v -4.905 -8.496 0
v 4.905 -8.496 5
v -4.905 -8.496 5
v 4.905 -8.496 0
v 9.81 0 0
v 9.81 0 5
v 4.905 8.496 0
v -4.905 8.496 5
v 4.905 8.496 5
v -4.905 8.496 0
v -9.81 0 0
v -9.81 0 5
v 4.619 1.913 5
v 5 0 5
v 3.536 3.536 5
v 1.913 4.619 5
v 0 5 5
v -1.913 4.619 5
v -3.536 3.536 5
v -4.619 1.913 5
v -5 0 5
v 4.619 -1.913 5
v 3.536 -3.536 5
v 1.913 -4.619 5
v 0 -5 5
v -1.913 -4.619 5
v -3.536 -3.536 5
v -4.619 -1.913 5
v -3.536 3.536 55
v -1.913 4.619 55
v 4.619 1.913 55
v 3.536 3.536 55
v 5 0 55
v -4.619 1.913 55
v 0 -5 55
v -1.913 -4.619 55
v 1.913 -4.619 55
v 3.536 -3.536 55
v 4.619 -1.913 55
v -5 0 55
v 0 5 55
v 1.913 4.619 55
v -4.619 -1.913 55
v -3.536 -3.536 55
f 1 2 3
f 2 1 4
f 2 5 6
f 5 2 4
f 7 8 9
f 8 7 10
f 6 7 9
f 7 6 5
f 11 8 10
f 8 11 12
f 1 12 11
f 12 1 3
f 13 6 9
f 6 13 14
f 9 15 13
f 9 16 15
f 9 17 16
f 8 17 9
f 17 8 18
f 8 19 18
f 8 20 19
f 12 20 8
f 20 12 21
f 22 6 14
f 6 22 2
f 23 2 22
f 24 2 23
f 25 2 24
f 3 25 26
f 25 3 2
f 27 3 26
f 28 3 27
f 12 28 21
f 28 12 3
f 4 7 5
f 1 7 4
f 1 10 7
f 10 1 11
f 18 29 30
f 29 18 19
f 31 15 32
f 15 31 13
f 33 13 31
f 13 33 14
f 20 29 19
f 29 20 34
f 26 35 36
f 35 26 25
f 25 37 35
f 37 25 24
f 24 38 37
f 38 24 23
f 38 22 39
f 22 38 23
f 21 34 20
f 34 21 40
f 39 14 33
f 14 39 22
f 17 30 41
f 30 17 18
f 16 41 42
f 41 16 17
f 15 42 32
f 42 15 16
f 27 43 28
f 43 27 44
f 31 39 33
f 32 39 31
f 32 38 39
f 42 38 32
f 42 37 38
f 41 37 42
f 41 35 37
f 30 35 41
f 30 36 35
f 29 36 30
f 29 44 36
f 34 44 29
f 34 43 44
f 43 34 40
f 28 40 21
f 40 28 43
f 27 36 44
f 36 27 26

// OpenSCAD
// M10 Bolt
union() {
  // A standard M10 bolt has a 19,62mm diameter and an height of 5mm
  color([0.5,0.5,0.5])
    cylinder(d=19.62, h=5, $fn=6);
  translate ([0,0,5])
    color([0.7,0.7,0.7])
      cylinder(d=10, h=50);
}
